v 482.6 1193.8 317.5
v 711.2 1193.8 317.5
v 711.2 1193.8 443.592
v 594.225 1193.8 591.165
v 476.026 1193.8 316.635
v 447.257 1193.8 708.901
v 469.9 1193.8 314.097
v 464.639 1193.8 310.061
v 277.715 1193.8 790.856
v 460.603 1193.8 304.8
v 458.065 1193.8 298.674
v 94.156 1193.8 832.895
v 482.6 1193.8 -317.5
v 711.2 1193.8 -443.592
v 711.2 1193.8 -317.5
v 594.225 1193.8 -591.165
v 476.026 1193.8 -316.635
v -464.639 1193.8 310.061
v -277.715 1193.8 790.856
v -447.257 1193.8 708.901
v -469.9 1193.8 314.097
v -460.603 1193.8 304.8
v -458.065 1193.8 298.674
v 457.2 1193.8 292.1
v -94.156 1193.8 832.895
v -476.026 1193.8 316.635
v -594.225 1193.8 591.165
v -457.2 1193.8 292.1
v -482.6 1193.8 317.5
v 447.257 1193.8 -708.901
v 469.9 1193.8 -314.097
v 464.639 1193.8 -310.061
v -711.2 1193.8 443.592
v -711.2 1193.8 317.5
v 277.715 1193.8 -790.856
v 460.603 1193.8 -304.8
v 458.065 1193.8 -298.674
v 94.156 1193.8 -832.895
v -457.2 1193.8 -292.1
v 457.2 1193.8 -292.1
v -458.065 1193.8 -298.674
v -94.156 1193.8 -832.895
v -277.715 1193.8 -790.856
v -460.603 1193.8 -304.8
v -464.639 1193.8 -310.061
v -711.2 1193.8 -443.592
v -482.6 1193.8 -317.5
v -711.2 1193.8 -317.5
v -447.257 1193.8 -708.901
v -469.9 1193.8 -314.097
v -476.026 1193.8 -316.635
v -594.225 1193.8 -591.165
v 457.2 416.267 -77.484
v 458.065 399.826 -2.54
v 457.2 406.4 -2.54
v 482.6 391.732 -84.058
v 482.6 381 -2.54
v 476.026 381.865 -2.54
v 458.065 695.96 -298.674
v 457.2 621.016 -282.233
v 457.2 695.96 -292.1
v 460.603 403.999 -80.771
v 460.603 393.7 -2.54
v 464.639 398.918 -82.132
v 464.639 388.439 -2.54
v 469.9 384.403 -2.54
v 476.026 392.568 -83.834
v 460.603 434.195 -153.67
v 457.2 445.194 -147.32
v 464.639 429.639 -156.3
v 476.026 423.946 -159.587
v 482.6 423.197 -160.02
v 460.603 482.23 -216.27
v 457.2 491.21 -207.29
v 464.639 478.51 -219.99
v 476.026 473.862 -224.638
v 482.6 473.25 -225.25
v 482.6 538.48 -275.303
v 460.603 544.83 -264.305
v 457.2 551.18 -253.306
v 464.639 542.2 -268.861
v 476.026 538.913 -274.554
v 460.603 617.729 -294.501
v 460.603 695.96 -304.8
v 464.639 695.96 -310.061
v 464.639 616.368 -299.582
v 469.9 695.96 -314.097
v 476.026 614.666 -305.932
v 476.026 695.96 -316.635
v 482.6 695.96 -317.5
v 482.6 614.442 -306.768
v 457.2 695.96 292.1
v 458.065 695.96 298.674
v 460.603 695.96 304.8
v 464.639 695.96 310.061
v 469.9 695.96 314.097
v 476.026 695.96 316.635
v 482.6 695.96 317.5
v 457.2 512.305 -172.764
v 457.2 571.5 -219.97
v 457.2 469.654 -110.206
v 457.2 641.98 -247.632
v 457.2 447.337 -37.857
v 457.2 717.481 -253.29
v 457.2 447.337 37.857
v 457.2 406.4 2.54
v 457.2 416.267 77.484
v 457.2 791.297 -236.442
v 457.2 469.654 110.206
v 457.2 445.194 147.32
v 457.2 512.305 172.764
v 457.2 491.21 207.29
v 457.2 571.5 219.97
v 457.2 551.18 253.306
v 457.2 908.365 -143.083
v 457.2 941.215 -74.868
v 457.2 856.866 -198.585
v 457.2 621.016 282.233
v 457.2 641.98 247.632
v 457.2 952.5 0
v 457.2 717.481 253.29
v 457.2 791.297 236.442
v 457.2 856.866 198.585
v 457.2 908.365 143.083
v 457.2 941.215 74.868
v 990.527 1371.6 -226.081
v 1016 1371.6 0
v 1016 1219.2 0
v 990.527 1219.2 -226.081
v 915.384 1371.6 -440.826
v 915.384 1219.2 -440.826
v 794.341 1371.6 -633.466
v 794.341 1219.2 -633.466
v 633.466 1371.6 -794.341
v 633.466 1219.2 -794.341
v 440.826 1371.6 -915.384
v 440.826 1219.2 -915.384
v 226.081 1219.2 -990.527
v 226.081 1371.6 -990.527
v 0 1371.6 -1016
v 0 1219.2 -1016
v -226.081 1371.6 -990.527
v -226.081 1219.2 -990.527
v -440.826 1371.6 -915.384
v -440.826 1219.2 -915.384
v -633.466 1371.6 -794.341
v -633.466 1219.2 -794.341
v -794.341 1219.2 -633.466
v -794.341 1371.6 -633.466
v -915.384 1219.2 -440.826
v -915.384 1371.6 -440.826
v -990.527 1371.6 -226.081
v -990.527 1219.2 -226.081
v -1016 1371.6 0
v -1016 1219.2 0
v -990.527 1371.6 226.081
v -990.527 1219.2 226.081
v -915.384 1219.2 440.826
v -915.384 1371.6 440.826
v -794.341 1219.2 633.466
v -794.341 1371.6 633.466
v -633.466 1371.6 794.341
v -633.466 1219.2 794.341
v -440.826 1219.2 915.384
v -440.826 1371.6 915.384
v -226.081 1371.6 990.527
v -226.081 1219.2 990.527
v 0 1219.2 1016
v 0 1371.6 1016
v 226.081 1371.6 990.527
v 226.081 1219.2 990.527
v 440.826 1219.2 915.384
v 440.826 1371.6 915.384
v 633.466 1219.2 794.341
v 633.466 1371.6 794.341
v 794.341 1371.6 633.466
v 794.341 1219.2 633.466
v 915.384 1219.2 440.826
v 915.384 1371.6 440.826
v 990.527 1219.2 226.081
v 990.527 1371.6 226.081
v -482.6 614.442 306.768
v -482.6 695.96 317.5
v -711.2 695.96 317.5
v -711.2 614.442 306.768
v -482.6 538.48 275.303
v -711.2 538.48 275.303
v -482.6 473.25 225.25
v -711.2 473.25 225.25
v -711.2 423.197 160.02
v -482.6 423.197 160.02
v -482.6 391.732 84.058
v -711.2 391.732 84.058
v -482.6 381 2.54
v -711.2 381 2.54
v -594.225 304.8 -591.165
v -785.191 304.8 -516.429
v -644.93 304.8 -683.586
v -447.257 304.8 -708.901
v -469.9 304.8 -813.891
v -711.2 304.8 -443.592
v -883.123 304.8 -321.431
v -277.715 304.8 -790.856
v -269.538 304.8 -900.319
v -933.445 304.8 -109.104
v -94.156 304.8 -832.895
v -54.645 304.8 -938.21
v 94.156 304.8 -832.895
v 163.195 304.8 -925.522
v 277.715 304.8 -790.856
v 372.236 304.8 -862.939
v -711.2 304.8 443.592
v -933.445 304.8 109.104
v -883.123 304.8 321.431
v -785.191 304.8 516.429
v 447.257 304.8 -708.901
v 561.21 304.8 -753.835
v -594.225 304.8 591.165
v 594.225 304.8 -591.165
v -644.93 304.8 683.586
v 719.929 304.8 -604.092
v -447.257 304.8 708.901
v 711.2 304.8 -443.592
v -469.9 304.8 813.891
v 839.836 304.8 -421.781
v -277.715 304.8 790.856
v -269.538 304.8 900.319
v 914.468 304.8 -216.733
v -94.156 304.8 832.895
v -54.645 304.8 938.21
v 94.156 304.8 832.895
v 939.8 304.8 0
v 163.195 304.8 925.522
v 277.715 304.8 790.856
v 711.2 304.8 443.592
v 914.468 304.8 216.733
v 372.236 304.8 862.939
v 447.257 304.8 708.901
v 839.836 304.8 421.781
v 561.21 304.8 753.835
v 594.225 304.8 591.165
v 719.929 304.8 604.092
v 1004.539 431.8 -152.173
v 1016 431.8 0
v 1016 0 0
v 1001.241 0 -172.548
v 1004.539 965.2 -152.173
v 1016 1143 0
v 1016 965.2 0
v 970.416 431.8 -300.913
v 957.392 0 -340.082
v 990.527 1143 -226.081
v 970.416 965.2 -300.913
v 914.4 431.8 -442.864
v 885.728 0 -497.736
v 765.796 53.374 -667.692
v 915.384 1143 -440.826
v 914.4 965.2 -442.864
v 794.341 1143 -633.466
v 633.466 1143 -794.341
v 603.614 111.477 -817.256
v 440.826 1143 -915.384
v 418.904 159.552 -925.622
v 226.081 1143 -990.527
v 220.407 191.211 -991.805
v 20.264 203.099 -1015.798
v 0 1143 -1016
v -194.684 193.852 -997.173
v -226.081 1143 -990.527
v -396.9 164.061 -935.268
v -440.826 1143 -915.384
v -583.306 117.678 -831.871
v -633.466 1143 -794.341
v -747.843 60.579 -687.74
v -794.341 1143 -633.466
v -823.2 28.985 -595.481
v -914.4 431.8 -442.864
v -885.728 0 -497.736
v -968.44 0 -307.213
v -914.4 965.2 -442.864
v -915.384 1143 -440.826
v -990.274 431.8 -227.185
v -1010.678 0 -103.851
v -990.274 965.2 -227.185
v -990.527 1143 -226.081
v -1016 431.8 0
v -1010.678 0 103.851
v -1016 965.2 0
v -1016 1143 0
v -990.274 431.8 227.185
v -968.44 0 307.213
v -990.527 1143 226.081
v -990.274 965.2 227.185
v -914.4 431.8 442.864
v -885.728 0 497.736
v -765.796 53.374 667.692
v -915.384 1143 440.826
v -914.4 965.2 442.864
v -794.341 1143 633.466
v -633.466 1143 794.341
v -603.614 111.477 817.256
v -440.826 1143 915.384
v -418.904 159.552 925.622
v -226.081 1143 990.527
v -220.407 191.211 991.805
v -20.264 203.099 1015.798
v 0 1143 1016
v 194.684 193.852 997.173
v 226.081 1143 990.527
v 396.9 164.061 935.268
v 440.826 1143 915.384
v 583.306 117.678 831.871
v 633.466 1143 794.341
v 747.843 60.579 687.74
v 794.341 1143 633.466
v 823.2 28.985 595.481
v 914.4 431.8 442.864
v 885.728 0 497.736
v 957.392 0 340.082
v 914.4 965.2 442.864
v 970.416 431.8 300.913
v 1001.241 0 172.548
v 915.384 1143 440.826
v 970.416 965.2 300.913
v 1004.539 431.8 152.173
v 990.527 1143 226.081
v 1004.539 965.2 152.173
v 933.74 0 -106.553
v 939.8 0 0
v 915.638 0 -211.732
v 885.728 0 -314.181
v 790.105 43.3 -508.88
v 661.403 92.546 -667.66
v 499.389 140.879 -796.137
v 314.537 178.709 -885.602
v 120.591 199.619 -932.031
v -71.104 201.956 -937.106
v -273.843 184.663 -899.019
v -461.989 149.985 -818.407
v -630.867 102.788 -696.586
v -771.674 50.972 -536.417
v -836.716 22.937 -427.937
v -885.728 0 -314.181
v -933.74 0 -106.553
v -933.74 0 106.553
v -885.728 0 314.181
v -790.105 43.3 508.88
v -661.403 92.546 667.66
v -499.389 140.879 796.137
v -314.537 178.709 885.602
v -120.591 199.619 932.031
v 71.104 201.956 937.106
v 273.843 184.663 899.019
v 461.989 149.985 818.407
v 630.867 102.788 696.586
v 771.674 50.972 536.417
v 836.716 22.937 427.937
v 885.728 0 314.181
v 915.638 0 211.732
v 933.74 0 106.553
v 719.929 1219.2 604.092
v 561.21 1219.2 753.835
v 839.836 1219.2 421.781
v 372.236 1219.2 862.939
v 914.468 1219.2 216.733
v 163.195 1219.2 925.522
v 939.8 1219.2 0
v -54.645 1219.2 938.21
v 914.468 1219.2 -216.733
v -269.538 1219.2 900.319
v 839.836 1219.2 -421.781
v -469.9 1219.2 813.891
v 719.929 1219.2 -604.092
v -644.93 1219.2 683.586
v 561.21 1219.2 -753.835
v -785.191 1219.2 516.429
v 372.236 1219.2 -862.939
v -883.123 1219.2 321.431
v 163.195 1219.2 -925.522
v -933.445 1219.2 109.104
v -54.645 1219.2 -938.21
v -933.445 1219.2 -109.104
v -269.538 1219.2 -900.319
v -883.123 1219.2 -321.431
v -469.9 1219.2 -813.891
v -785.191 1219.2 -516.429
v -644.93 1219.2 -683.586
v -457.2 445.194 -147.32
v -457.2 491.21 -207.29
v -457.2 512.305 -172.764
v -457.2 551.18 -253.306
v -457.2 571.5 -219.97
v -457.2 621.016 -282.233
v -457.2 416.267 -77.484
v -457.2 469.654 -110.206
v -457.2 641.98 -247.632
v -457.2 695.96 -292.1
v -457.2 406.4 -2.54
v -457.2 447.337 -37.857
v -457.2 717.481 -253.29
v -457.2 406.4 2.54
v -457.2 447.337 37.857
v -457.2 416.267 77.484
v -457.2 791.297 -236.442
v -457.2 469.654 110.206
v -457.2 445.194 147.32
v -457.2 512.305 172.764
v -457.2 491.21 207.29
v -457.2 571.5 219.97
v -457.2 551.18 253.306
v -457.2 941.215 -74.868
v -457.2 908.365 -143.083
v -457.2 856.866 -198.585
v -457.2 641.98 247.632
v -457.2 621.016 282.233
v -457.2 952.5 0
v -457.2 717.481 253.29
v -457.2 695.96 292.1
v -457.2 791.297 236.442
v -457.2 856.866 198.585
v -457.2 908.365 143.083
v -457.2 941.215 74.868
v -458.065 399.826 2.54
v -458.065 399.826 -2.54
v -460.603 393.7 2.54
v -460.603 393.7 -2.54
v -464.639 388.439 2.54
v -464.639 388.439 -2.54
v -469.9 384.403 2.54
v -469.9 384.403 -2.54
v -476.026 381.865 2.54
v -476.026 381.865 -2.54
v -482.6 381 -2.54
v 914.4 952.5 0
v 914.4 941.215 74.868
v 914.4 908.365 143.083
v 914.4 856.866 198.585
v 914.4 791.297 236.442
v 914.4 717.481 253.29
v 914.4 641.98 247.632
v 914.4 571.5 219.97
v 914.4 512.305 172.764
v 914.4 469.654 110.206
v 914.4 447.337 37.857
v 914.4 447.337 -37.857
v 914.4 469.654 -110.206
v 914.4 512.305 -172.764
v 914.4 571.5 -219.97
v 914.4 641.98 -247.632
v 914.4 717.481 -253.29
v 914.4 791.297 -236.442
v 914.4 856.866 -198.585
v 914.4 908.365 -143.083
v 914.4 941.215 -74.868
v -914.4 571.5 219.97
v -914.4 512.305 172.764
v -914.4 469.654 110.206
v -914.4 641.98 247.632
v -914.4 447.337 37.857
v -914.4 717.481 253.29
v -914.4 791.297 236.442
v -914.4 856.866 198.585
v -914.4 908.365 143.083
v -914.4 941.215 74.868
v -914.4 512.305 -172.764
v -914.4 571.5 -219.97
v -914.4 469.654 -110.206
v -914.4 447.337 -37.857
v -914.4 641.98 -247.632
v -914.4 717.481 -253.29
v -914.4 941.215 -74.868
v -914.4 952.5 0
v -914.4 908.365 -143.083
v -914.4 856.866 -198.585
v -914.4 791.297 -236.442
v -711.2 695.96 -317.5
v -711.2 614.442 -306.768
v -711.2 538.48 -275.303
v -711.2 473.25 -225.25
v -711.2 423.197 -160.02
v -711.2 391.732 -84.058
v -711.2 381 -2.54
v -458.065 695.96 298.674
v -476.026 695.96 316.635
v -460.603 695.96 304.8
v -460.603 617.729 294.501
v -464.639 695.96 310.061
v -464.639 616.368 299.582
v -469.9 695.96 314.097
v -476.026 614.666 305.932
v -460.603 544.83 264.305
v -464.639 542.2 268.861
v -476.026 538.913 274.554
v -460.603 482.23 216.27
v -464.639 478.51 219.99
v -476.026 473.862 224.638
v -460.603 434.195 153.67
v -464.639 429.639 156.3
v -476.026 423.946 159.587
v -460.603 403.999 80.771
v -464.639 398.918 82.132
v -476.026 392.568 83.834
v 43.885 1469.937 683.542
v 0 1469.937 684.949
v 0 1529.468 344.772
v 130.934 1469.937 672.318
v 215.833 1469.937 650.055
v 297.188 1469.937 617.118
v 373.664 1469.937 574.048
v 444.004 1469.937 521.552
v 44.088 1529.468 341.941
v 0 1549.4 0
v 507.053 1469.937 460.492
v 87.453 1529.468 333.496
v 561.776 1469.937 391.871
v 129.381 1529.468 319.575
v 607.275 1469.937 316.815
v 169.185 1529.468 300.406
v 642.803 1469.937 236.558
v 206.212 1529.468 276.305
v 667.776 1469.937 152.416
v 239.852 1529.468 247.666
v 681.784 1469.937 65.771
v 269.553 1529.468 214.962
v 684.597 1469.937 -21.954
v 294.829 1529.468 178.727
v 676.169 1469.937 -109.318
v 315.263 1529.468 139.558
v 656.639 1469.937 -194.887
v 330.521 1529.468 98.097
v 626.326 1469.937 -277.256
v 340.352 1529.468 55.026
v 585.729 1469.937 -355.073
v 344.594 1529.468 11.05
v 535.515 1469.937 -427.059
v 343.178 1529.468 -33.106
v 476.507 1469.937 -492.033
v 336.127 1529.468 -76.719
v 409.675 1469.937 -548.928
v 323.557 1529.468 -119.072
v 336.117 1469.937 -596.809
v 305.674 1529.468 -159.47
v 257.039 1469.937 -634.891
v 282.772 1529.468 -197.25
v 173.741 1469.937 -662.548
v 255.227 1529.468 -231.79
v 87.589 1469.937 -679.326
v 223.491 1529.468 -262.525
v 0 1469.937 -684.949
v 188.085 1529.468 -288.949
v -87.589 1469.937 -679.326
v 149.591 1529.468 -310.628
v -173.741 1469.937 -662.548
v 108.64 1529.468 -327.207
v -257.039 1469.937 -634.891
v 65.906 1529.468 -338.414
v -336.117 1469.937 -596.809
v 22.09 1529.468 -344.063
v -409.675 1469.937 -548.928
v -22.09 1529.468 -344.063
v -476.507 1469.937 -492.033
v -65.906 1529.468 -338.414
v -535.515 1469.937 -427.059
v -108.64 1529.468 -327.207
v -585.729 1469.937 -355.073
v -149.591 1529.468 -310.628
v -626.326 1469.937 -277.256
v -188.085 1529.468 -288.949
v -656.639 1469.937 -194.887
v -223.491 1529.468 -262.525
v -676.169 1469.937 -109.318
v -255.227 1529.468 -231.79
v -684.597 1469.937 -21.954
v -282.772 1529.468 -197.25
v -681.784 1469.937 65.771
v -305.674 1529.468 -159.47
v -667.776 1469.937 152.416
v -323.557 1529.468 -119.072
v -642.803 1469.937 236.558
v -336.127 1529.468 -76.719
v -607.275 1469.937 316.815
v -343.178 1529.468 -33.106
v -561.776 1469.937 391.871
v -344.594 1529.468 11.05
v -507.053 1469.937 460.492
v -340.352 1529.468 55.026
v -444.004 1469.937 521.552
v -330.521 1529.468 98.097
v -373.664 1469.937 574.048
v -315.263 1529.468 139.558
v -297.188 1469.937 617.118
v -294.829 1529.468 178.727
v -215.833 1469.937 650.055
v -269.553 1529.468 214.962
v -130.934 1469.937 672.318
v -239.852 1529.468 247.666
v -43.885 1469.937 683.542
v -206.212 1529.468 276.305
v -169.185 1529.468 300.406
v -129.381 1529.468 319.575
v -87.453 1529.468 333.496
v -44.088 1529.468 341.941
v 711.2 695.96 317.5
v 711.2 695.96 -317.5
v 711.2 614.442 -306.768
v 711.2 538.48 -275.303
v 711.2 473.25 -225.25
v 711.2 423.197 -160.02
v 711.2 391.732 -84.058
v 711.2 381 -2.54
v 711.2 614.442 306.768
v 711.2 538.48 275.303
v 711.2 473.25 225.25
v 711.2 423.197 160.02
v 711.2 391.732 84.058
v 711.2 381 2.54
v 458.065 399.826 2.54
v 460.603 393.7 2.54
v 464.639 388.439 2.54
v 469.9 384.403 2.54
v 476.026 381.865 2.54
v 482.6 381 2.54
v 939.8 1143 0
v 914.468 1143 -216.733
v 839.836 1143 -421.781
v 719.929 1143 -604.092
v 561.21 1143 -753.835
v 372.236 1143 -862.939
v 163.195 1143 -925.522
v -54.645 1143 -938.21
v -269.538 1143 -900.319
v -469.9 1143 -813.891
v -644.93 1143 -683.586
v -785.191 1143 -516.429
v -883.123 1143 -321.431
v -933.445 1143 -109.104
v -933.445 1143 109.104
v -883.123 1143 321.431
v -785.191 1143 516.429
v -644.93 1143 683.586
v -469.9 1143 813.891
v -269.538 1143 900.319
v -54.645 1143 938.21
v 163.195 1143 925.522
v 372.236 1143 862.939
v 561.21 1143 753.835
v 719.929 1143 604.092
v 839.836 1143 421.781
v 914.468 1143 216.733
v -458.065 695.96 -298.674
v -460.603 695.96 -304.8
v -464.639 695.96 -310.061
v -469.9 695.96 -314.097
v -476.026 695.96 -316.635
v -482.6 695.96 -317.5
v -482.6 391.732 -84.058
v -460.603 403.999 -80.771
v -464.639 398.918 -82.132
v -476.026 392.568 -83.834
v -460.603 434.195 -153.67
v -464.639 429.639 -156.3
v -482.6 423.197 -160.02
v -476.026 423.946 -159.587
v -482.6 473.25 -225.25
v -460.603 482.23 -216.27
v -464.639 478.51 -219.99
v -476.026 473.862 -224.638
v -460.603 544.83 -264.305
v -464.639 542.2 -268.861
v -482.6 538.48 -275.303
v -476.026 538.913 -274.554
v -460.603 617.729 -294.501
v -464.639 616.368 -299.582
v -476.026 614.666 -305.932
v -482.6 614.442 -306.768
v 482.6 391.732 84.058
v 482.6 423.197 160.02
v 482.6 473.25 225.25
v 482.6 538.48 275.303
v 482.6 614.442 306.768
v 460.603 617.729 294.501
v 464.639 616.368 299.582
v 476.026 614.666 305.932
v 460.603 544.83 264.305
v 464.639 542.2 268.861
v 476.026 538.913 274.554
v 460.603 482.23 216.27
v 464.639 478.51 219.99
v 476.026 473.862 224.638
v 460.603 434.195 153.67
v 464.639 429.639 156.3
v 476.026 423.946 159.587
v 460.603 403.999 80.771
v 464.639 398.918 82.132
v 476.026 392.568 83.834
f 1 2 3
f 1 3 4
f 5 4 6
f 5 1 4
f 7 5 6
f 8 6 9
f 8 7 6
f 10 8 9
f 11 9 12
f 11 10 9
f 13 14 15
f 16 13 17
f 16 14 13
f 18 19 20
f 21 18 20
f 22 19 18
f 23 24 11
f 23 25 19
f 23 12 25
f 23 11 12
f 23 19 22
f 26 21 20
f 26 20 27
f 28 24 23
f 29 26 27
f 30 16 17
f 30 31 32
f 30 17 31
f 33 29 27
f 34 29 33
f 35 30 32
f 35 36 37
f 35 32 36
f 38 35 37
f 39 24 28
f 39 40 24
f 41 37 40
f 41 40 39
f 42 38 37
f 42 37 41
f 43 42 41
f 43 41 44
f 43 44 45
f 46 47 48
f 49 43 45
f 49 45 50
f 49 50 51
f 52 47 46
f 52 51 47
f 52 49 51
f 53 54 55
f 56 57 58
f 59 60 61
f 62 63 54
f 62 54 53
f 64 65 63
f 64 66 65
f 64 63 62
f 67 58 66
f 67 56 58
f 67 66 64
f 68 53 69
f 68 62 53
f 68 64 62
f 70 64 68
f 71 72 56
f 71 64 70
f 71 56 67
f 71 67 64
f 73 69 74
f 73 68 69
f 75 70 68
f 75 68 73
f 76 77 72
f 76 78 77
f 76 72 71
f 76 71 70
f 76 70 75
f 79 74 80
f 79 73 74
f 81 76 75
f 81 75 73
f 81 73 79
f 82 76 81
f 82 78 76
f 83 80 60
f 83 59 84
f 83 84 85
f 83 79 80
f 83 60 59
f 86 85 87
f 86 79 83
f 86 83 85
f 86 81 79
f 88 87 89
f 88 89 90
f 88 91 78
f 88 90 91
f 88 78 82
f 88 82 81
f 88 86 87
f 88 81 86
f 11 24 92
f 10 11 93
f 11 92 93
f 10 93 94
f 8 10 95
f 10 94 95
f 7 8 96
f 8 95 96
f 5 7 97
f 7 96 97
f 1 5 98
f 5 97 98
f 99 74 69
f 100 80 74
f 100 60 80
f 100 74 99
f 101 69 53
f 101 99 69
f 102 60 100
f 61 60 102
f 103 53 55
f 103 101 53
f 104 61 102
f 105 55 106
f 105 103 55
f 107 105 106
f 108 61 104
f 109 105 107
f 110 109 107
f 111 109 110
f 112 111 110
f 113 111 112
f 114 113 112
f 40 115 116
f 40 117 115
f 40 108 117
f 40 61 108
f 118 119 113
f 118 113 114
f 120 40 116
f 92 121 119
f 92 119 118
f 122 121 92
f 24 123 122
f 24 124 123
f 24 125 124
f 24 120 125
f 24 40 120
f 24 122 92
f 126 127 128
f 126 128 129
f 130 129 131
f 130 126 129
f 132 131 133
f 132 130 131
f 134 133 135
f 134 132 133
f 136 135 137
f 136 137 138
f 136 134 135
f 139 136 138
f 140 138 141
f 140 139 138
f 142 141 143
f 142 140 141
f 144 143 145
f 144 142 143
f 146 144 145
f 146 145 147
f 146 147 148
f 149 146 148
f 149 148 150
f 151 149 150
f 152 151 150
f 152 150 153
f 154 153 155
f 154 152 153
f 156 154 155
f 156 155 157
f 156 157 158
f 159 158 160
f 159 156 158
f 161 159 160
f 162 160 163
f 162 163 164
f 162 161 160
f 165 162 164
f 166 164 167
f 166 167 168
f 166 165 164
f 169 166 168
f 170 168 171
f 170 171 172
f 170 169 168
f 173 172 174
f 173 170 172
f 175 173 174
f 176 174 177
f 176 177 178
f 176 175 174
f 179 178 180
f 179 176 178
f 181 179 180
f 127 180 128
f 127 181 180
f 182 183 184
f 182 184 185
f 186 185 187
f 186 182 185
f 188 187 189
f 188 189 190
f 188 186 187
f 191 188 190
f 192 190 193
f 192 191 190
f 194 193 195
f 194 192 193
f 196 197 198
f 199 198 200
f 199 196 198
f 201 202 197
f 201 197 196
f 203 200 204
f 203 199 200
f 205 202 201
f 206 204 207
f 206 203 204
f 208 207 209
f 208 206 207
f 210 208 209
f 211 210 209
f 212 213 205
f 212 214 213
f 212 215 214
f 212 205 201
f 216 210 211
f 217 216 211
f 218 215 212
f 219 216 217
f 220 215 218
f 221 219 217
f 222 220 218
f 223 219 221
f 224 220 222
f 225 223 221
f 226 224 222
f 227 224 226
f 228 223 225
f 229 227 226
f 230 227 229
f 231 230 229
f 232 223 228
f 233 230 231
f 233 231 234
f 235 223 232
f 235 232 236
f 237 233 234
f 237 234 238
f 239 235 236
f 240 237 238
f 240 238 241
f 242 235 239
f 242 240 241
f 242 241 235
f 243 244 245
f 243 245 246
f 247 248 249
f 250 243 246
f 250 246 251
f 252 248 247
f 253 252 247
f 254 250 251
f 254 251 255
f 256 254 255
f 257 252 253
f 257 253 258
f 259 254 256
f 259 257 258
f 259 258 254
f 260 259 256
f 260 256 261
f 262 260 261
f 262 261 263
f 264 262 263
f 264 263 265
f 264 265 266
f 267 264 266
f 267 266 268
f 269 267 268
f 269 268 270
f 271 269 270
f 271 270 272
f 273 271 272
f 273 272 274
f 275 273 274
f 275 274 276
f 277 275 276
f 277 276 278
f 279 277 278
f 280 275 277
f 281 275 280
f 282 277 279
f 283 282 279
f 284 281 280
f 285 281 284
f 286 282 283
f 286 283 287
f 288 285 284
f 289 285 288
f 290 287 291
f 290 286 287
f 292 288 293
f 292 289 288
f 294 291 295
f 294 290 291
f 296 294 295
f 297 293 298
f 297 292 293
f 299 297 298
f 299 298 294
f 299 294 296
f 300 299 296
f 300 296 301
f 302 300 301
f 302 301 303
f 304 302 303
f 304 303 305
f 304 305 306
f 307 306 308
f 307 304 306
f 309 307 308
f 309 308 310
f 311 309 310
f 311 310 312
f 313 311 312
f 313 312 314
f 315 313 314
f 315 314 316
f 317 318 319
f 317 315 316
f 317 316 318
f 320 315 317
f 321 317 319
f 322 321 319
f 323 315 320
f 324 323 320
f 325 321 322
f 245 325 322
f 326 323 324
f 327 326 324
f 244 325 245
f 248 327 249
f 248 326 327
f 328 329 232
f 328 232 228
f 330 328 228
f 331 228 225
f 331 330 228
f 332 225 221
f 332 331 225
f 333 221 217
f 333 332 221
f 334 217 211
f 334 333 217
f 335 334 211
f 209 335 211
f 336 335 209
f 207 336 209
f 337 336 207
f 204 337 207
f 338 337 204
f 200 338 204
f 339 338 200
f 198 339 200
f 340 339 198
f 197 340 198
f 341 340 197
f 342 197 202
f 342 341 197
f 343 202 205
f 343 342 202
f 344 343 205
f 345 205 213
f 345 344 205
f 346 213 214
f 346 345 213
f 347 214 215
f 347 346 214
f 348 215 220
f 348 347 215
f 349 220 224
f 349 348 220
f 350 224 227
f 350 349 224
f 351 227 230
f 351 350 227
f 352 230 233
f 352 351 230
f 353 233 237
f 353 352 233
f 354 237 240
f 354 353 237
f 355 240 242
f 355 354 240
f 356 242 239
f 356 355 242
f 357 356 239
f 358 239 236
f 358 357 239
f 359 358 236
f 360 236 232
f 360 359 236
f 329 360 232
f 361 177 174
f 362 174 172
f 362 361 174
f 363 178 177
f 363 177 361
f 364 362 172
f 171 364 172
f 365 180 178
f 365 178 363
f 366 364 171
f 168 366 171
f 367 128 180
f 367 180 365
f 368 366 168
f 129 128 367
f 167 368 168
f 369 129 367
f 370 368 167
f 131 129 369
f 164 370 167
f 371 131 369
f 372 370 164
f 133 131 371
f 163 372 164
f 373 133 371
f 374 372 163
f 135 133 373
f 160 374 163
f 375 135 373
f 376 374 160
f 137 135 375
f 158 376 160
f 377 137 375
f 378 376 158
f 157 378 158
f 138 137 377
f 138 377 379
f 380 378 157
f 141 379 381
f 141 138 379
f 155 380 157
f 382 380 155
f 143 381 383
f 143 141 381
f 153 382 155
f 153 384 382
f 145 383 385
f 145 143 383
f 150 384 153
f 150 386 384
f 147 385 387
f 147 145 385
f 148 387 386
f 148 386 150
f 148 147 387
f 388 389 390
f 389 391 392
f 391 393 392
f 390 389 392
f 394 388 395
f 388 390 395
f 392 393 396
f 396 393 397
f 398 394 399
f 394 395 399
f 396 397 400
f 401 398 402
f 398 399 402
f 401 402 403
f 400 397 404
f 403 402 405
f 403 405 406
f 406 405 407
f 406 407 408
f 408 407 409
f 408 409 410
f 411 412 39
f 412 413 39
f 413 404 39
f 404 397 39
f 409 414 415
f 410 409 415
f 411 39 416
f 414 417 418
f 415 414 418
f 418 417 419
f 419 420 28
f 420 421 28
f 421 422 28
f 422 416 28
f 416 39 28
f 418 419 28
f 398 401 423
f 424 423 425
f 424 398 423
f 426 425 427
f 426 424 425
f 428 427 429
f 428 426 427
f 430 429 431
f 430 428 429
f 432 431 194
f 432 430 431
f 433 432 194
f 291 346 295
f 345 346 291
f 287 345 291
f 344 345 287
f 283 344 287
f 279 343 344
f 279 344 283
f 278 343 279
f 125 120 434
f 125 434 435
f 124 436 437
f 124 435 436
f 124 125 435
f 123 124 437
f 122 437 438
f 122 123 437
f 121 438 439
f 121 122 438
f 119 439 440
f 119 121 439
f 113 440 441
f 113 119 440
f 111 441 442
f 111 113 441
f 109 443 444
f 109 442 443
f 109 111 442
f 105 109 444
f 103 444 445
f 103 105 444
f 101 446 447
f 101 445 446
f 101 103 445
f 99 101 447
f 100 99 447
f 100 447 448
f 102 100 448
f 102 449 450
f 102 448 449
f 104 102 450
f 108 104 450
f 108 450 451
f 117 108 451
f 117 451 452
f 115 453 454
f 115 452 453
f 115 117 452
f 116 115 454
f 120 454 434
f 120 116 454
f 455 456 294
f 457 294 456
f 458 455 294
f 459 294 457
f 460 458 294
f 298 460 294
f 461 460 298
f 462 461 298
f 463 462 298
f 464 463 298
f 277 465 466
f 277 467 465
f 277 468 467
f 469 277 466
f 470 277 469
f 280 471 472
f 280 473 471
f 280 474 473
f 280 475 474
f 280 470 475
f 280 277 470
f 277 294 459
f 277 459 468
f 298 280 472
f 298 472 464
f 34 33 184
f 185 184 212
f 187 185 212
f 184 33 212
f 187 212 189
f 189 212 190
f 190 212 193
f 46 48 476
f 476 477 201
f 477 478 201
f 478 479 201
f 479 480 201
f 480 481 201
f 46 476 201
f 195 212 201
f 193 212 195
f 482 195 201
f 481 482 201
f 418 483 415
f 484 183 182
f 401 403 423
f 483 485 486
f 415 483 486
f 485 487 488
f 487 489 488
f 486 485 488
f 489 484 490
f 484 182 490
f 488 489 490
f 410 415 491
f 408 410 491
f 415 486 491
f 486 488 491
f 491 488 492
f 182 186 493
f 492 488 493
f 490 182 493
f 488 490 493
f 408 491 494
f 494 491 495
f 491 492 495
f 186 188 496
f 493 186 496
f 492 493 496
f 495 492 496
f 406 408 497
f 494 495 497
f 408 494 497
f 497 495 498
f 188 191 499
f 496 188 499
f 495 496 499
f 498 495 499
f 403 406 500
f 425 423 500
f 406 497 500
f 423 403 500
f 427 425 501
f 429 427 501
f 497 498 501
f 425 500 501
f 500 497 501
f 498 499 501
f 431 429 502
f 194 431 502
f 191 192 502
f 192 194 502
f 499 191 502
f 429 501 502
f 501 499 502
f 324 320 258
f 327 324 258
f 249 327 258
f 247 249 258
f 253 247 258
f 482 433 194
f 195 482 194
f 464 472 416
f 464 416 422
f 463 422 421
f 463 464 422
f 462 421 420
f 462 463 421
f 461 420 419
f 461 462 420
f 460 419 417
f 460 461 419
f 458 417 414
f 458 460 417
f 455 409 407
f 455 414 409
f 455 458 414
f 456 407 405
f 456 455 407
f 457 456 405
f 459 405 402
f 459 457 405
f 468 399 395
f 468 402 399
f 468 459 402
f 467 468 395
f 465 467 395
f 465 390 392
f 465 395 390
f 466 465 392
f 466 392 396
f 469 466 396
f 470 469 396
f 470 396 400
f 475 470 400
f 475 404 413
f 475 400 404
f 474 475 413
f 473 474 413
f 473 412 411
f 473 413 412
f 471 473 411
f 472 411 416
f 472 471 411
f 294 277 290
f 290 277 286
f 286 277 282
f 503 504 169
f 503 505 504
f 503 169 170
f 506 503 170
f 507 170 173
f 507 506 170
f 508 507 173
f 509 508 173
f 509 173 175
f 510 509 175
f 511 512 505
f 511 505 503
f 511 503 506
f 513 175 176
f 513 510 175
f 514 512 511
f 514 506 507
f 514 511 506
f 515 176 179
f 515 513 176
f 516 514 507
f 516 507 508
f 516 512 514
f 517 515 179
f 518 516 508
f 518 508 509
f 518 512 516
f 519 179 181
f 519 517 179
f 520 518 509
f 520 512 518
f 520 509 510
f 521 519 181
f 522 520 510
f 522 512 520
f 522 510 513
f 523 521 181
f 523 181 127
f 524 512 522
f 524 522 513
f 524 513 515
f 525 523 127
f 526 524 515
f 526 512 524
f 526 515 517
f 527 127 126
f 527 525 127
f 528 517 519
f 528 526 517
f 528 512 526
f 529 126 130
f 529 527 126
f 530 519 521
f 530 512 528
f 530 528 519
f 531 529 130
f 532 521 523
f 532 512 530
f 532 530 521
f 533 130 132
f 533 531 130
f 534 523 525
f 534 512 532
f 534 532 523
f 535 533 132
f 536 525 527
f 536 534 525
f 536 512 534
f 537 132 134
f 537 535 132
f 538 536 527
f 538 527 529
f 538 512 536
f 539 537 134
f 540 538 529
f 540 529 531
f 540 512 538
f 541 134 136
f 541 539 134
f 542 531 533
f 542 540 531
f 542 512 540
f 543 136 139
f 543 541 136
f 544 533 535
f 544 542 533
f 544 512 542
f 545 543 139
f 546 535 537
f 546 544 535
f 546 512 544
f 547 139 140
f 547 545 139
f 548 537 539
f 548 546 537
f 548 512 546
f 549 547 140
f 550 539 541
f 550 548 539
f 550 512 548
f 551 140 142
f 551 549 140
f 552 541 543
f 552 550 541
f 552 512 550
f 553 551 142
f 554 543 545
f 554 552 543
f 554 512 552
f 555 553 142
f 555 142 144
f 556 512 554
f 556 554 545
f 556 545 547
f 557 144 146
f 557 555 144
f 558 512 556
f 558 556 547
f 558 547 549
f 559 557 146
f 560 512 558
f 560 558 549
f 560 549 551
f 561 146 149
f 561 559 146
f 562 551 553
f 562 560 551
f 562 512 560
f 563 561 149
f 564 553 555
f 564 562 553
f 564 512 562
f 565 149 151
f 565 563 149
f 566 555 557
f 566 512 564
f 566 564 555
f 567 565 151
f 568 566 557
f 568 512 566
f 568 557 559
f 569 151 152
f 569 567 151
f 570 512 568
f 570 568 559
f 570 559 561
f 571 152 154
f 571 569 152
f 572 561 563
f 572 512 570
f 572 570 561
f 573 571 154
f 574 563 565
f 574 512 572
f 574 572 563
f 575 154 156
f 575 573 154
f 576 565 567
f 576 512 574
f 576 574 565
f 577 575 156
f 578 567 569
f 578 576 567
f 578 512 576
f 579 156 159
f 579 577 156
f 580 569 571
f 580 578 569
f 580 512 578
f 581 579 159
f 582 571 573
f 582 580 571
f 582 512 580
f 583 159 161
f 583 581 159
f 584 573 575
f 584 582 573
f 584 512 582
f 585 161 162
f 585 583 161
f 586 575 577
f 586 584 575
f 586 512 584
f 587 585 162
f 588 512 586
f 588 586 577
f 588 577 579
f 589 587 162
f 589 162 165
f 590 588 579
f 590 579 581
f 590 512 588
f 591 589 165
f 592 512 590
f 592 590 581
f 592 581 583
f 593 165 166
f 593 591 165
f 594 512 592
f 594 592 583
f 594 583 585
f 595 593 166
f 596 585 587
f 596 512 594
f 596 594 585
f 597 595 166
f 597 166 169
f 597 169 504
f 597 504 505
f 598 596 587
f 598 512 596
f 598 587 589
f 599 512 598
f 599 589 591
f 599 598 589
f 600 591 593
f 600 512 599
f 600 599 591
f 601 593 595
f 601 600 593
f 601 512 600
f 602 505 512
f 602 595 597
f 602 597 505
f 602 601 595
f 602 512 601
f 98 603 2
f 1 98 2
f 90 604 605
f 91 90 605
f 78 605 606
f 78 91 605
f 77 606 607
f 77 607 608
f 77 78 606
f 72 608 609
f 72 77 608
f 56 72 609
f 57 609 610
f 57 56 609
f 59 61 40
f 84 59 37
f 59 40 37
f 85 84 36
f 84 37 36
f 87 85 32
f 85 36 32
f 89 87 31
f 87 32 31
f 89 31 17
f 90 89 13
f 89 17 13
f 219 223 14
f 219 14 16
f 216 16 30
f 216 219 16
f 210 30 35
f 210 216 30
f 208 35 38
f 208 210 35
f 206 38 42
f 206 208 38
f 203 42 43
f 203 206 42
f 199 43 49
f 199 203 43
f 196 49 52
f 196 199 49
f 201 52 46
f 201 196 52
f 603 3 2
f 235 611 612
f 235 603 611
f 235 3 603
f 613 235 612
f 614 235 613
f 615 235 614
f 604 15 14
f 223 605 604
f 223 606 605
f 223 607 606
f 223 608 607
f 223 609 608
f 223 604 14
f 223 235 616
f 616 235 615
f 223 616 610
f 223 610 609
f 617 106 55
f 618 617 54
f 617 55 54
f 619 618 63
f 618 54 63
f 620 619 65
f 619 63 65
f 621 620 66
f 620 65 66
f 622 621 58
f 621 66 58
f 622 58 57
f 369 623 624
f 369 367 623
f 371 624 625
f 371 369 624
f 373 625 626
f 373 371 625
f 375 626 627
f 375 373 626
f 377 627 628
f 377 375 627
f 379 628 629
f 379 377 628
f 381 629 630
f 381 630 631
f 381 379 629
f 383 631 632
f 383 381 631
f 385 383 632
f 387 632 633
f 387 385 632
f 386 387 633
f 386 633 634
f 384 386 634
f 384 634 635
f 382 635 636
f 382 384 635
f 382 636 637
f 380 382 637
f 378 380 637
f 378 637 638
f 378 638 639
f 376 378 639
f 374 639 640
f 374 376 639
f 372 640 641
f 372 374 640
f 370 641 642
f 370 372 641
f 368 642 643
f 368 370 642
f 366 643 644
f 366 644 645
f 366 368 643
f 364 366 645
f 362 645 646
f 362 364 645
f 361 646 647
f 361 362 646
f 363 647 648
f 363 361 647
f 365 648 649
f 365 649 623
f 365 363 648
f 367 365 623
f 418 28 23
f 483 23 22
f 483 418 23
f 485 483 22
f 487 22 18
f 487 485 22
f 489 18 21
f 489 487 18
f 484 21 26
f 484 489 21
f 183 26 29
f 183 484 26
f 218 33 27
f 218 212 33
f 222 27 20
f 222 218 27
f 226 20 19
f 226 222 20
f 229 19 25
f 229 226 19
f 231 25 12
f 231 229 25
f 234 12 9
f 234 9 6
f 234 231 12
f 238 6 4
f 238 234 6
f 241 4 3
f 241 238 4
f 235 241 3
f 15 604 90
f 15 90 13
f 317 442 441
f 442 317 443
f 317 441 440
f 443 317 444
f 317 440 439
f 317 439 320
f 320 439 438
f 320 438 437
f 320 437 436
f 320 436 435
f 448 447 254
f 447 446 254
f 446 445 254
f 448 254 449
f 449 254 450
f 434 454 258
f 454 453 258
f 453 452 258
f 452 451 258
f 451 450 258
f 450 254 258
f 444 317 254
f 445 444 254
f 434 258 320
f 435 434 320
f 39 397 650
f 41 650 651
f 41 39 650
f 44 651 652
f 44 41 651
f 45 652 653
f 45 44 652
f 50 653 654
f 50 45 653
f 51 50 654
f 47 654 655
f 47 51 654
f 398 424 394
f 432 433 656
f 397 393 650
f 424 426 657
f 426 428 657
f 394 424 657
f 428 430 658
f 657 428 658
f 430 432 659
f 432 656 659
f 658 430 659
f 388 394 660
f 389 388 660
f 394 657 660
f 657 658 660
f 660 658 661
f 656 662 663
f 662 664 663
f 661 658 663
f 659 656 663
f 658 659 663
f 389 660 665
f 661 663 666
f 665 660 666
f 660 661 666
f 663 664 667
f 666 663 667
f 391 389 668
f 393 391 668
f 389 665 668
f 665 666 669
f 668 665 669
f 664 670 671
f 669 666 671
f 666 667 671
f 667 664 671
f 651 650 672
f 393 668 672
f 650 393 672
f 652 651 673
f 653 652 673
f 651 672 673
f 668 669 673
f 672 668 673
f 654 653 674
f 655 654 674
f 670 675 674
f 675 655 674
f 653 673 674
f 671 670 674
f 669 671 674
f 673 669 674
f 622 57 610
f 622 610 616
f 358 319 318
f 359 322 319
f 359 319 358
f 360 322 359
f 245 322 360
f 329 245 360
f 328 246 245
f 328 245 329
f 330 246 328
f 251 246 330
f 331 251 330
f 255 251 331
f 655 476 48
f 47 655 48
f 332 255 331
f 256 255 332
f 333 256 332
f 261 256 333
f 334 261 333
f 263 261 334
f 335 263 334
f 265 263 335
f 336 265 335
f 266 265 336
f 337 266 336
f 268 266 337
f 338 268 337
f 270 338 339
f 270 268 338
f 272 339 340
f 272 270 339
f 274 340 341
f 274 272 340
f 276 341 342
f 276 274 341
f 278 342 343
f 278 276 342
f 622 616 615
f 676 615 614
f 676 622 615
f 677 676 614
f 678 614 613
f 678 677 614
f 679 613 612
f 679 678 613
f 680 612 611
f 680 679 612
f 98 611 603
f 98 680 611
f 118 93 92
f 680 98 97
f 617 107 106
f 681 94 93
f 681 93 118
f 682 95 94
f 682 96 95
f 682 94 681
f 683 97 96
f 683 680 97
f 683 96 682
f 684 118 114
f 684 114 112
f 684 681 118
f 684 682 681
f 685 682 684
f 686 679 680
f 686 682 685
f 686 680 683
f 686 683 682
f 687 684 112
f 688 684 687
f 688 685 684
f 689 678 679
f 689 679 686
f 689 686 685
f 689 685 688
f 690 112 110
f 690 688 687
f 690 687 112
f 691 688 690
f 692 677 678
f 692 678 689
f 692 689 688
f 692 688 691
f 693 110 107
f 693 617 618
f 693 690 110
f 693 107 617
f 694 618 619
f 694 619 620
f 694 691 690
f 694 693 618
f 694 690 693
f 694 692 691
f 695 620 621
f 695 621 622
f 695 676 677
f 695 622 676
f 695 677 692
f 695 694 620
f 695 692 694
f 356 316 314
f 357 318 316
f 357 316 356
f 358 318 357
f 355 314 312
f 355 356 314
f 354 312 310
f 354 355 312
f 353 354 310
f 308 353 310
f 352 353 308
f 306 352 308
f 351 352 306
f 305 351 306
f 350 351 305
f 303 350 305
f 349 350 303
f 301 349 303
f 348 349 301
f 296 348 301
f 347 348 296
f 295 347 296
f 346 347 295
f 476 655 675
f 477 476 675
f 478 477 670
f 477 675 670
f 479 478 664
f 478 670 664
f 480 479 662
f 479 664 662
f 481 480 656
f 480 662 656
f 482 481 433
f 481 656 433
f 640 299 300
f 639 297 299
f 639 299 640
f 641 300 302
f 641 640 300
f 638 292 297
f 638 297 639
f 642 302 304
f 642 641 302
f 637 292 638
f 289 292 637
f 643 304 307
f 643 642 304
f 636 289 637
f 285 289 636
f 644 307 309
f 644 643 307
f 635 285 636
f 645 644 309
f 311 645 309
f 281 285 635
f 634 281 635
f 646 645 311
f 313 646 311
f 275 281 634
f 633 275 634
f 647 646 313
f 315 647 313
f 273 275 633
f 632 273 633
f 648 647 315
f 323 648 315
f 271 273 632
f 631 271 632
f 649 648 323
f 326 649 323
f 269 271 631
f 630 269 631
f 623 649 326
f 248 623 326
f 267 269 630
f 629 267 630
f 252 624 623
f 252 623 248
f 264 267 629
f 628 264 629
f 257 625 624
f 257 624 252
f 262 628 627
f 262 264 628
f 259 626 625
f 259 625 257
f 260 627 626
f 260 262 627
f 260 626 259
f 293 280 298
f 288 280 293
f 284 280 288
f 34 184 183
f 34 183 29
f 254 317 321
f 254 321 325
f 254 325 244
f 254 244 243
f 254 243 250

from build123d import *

# Parameters (mm, degrees)
CUT_EXTRUDE1_DEPTH      = 1987.403423275
CUT_EXTRUDE1_DEPTH_BACK = 1987.403423275
SKETCH2_W               = 225.307580662
SKETCH2_H               = 533.4
BOSS_EXTRUDE1_START     = 889
BOSS_EXTRUDE1_DEPTH     = 889
SKETCH4_W               = 635
SKETCH4_H               = 812.8
BOSS_EXTRUDE2_DEPTH     = 254
FILLET1_R               = 314.96
FILLET1_OF_MIRROR1_R    = 314.96
CUT_EXTRUDE2_DEPTH      = 1987.403423275
CUT_EXTRUDE2_DEPTH_BACK = 1987.403423275
SKETCH5_R               = 254
CUT_EXTRUDE3_DEPTH      = 1987.403423275
CUT_EXTRUDE3_DEPTH_BACK = 1987.403423275
SKETCH6_R               = 2032
DOME1_FACE_RADIUS       = 1016
DOME1_HEIGHT            = 177.8
FILLET2_R               = 25.4


with BuildPart() as part:
    # Sketch1 → Revolve1 (revolve)
    with BuildSketch(Plane.XY):
        Polygon((1016, 0), (1016, 1143), (939.8, 1143), (939.8, 1219.2), (1016, 1219.2), (1016, 1371.6), (0, 1371.6), (0, 1193.8), (838.2, 1193.8), (838.2, 304.8), (939.8, 304.8), (939.8, 0), align=None)
    revolve(axis=Axis((0, 0, 0), (0, 1, 0)))

    # Sketch2 → Cut-Extrude1 (cut, two sides: drawn at the far end of the back side and taken through both)
    with BuildSketch(Plane.XY.offset(-CUT_EXTRUDE1_DEPTH_BACK)):
        with Locations((-1027.053790331, 698.5)):
            Rectangle(SKETCH2_W, SKETCH2_H)
        with Locations((1027.053790331, 698.5)):
            Rectangle(SKETCH2_W, SKETCH2_H)
    extrude(amount=CUT_EXTRUDE1_DEPTH + CUT_EXTRUDE1_DEPTH_BACK, mode=Mode.SUBTRACT)

    # Sketch3 → Boss-Extrude1 (add)
    with BuildSketch(Plane.XZ.offset(-1193.8).offset(BOSS_EXTRUDE1_START)):
        with BuildLine():
            Line((-711.2, 443.591929593), (-711.2, -443.591929593))
            ThreePointArc((-711.2, -443.591929593), (-838.2, 0), (-711.2, 443.591929593))
        make_face()
        with BuildLine():
            Line((711.2, 443.591929593), (711.2, -443.591929593))
            ThreePointArc((711.2, -443.591929593), (838.2, 0), (711.2, 443.591929593))
        make_face()
    extrude(amount=-BOSS_EXTRUDE1_DEPTH)

    # Sketch4 → Boss-Extrude2 (add)
    with BuildSketch(Plane.ZY.offset(-711.2)):
        with Locations((0, 787.4)):
            Rectangle(SKETCH4_W, SKETCH4_H)
    boss_extrude2 = extrude(amount=BOSS_EXTRUDE2_DEPTH)

    # Fillet1
    fillet1_edges = [part.edges().sort_by_distance(p)[0] for p in [
        (584.2, 381, 317.5),
        (584.2, 381, -317.5),
    ]]
    fillet(fillet1_edges, radius=FILLET1_R)

    # Mirror1: Boss-Extrude2 across plane
    add(boss_extrude2.mirror(Plane(origin=(0, 0, 0), x_dir=(0, 0, 1), z_dir=(1, 0, 0))))

    # Fillet1 of Mirror1
    fillet1_of_mirror1_edges = [part.edges().sort_by_distance(p)[0] for p in [
        (-584.2, 381, 317.5),
        (-584.2, 381, -317.5),
    ]]
    fillet(fillet1_of_mirror1_edges, radius=FILLET1_OF_MIRROR1_R)

    # Sketch5 → Cut-Extrude2 (cut, two sides: drawn at the far end of the back side and taken through both)
    with BuildSketch(Plane(origin=(0, 0, 0), x_dir=(0, 0, -1), z_dir=(1, 0, 0)).offset(-CUT_EXTRUDE2_DEPTH_BACK)):
        with Locations(Location((0, 698.5, 0), (0, 0, 90))):
            Circle(SKETCH5_R)
    extrude(amount=CUT_EXTRUDE2_DEPTH + CUT_EXTRUDE2_DEPTH_BACK, mode=Mode.SUBTRACT)

    # Sketch6 → Cut-Extrude3 (cut, two sides: drawn at the far end of the back side and taken through both)
    with BuildSketch(Plane.XY.offset(-CUT_EXTRUDE3_DEPTH_BACK)):
        with Locations((0, -1828.8)):
            Circle(SKETCH6_R)
    extrude(amount=CUT_EXTRUDE3_DEPTH + CUT_EXTRUDE3_DEPTH_BACK, mode=Mode.SUBTRACT)

    # Dome1: a dome of height H over a round flat face of radius A is a cap of a sphere of radius (A * A + H * H) / (2 * H)
    dome1_r = (DOME1_FACE_RADIUS * DOME1_FACE_RADIUS + DOME1_HEIGHT * DOME1_HEIGHT) / (2 * DOME1_HEIGHT)
    dome1_base = Plane((0, 1371.6, 0), z_dir=(0, 1, 0))
    with Locations(dome1_base.offset(DOME1_HEIGHT - dome1_r)):
        dome1_ball = Sphere(dome1_r, mode=Mode.PRIVATE)
    add(split(dome1_ball, bisect_by=dome1_base, keep=Keep.TOP, mode=Mode.PRIVATE))

    # Fillet2
    fillet2_edges = [part.edges().sort_by_distance(p)[0] for p in [
        (457.2, 944.88, -317.5),
        (457.2, 944.88, 317.5),
        (457.2, 381, 0),
        (457.2, 473.249648197, -225.250351803),
        (457.2, 473.249648197, 225.250351803),
        (-457.2, 944.88, -317.5),
        (-457.2, 381, 0),
        (-457.2, 944.88, 317.5),
        (-457.2, 473.249648197, -225.250351803),
        (-457.2, 473.249648197, 225.250351803),
    ]]
    fillet(fillet2_edges, radius=FILLET2_R)


solid = part.part
